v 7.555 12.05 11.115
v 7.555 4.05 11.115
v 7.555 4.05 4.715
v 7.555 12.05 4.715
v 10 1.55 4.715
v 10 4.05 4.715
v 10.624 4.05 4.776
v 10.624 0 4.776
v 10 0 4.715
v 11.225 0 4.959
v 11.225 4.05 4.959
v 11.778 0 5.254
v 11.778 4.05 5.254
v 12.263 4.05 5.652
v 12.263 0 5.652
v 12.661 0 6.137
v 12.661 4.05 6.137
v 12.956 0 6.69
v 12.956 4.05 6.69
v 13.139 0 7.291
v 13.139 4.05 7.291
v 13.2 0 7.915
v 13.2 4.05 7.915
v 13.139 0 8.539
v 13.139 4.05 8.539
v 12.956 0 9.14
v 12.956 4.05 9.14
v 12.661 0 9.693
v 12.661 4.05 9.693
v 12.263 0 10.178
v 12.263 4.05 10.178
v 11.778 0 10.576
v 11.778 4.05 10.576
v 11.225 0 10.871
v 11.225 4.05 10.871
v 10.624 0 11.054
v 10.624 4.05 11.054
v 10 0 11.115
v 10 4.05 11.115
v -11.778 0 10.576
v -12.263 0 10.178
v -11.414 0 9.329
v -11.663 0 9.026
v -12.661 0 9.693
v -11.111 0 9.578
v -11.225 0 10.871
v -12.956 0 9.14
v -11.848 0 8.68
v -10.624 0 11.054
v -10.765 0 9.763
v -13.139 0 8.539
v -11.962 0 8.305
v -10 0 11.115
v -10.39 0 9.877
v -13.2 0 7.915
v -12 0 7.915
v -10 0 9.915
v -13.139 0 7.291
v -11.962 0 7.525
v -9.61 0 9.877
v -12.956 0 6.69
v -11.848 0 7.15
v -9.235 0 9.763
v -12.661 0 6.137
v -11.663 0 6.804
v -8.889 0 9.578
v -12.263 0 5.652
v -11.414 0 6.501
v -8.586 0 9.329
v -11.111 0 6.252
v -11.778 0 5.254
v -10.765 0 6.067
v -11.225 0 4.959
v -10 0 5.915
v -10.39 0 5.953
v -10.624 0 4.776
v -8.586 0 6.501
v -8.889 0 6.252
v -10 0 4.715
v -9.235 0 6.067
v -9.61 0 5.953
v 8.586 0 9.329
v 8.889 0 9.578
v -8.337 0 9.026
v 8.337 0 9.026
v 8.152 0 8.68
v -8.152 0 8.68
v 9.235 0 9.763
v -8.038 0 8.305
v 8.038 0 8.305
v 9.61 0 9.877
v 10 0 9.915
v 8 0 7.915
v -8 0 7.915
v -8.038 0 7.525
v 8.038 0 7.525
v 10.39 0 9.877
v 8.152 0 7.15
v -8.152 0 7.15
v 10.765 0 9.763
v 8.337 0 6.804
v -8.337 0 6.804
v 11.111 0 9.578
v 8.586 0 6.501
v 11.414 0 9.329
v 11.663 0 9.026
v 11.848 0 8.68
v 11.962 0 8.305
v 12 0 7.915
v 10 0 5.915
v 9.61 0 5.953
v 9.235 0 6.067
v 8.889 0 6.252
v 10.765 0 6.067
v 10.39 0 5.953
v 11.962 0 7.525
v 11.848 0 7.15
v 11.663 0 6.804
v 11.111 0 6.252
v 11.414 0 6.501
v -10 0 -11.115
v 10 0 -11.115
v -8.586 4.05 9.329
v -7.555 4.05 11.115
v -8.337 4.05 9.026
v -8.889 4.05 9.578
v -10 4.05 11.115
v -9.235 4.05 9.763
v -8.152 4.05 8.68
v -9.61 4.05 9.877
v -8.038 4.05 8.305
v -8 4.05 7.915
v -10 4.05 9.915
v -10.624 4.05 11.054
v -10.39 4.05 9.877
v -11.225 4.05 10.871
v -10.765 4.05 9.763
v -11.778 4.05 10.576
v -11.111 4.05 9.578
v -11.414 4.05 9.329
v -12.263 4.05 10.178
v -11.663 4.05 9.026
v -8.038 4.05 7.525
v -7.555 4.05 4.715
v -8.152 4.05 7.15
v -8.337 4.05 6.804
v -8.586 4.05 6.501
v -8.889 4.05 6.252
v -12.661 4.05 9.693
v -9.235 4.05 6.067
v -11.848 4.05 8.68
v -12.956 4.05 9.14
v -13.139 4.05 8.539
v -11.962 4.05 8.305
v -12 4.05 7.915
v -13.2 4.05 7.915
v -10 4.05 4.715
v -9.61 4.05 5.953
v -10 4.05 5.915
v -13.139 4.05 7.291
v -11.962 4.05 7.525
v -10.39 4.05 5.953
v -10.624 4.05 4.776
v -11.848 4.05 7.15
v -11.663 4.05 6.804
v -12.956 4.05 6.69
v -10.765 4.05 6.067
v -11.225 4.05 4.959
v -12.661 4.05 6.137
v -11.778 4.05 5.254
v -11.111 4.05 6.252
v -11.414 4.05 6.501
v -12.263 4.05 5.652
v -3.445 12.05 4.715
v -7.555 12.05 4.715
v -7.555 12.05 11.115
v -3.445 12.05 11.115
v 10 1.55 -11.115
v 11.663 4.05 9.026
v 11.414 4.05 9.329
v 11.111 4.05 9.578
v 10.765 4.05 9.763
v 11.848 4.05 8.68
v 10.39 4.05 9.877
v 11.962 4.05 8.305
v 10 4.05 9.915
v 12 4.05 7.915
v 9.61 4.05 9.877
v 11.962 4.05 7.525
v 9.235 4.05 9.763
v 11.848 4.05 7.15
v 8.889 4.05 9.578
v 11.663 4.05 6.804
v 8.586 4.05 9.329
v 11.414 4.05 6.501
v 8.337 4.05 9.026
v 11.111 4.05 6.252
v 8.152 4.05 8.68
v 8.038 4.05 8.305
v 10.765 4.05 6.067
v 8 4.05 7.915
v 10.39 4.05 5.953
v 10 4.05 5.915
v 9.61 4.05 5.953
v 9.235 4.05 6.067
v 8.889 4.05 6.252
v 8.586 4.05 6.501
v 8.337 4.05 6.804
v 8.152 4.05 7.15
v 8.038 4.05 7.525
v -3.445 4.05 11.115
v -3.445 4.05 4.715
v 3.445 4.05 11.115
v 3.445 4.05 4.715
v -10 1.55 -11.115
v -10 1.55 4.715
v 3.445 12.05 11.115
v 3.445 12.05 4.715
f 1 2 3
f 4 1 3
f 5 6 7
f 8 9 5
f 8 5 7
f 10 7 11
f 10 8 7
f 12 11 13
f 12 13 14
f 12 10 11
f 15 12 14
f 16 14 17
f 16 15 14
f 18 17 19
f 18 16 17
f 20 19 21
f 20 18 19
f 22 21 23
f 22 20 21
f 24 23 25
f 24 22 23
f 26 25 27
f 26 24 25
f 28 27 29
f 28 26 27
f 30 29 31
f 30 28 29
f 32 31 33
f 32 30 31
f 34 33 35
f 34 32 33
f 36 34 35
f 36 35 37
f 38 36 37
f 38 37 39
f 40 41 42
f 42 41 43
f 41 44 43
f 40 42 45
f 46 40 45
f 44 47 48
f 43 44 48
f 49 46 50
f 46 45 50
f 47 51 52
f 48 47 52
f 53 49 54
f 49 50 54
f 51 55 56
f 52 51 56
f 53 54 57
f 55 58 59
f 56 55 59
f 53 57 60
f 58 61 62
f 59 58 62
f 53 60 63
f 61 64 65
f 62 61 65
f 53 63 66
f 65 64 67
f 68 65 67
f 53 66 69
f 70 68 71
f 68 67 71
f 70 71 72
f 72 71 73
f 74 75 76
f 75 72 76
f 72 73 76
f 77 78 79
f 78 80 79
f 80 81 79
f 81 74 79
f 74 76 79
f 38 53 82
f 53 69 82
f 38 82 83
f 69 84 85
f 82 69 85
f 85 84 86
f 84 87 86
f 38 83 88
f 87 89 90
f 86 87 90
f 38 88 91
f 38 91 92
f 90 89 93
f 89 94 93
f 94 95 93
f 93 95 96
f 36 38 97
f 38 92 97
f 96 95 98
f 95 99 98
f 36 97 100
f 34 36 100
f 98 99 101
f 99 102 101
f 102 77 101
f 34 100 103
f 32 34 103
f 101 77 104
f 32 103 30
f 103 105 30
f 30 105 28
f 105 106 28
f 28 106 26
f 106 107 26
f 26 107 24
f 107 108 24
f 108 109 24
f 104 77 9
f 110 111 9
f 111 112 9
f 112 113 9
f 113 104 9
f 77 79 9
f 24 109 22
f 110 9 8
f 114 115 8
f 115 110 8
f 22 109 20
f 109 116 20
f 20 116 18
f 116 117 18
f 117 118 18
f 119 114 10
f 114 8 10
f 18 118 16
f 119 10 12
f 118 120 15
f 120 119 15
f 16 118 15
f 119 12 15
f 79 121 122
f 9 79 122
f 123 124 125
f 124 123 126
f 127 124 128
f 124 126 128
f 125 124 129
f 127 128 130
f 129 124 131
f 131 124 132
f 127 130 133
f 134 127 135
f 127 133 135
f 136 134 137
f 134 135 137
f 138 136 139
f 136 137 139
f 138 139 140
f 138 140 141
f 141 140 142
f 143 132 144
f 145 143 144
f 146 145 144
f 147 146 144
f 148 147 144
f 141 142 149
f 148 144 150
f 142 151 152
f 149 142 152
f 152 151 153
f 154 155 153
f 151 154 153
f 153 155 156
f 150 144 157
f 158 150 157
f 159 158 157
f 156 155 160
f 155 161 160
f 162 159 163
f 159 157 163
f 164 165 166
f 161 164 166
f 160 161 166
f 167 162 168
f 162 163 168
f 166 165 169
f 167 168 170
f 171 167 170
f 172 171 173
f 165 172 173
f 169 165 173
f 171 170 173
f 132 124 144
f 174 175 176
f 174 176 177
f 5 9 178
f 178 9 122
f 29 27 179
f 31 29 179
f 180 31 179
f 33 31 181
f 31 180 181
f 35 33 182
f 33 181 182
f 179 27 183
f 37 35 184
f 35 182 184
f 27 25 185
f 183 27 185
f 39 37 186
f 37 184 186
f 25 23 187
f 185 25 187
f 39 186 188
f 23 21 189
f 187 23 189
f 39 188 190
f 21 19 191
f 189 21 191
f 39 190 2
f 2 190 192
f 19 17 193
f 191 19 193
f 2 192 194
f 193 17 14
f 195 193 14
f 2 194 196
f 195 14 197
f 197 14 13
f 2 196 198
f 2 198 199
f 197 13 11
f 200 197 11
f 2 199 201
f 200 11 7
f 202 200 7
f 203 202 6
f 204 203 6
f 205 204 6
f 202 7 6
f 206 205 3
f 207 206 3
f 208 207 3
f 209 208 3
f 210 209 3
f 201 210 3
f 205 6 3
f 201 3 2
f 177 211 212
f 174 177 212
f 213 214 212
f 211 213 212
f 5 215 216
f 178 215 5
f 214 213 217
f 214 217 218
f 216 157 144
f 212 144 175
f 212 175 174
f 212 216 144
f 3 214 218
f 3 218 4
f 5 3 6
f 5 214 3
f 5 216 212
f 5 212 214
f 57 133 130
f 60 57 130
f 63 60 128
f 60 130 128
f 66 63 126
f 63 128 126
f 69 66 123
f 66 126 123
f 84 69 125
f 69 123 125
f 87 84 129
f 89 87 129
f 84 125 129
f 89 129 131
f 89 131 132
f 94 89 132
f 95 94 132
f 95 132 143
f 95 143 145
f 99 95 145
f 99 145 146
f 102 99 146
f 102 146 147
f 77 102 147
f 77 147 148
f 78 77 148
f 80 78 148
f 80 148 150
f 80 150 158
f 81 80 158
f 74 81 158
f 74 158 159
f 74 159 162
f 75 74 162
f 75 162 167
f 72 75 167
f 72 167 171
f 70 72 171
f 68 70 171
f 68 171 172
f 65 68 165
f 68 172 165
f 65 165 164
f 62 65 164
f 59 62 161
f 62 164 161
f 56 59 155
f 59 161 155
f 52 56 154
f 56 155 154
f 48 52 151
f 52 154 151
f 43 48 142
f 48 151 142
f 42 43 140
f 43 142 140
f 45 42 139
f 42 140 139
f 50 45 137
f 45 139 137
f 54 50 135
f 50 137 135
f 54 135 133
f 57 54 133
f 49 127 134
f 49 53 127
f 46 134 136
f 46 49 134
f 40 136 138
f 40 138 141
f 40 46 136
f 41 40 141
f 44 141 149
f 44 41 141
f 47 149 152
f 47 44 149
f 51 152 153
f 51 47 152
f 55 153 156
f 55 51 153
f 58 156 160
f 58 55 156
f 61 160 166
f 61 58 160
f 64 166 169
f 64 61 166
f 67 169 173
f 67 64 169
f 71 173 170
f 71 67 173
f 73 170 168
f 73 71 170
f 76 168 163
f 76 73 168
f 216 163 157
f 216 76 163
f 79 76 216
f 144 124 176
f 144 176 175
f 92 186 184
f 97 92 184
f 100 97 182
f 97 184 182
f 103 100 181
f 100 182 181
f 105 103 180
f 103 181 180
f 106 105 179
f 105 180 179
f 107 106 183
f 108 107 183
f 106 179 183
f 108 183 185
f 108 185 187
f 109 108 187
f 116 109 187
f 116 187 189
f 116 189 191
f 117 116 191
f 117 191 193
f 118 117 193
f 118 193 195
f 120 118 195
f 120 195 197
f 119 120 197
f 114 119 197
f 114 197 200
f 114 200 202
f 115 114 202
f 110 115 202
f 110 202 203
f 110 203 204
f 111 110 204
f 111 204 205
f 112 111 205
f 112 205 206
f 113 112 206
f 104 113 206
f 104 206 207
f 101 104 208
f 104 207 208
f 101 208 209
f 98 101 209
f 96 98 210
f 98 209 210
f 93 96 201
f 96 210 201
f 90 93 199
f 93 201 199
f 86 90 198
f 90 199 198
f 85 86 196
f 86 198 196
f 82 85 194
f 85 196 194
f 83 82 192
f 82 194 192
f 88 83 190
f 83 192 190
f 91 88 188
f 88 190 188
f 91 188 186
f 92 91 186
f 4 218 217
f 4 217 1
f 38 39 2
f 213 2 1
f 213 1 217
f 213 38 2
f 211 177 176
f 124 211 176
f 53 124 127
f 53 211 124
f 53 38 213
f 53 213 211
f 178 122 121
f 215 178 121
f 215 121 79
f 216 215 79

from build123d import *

# Parameters (mm, degrees)
BOSS_EXTRUDE1_DEPTH = 1.55
BOSS_EXTRUDE2_DEPTH = 2.5
SKETCH4_W           = 4.11
SKETCH4_H           = 6.4
BOSS_EXTRUDE3_DEPTH = 8
SKETCH6_R           = 2
CUT_EXTRUDE1_DEPTH  = 20.020600017


with BuildPart() as part:
    # Sketch1 → Boss-Extrude1 (new body)
    with BuildSketch(Plane(origin=(0, 0, 0), x_dir=(1, 0, 0), z_dir=(0, 1, 0))):
        with BuildLine():
            Line((10, -4.715), (10, 11.115))
            Line((10, 11.115), (-10, 11.115))
            Line((-10, 11.115), (-10, -4.715))
            ThreePointArc((-10, -4.715), (-13.2, -7.915), (-10, -11.115))
            Line((-10, -11.115), (10, -11.115))
            ThreePointArc((10, -11.115), (13.2, -7.915), (10, -4.715))
        make_face()
    extrude(amount=BOSS_EXTRUDE1_DEPTH)

    # Sketch3 → Boss-Extrude2 (add)
    with BuildSketch(Plane(origin=(0, 1.55, 0), x_dir=(1, 0, 0), z_dir=(0, 1, 0))):
        with BuildLine():
            Line((-10, -4.715), (10, -4.715))
            ThreePointArc((10, -4.715), (13.2, -7.915), (10, -11.115))
            Line((10, -11.115), (-10, -11.115))
            ThreePointArc((-10, -11.115), (-13.2, -7.915), (-10, -4.715))
        make_face()
    extrude(amount=BOSS_EXTRUDE2_DEPTH)

    # Sketch4 → Boss-Extrude3 (add)
    with BuildSketch(Plane(origin=(0, 4.05, 0), x_dir=(1, 0, 0), z_dir=(0, 1, 0))):
        with Locations((-5.5, -7.915)):
            Rectangle(SKETCH4_W, SKETCH4_H)
        with Locations((5.5, -7.915)):
            Rectangle(SKETCH4_W, SKETCH4_H)
    extrude(amount=BOSS_EXTRUDE3_DEPTH)

    # Sketch6 → Cut-Extrude1 (cut, through all)
    with BuildSketch(Plane(origin=(0, 4.05, 0), x_dir=(1, 0, 0), z_dir=(0, 1, 0))):
        with Locations(Location((-10, -7.915, 0), (0, 0, 270))):
            Circle(SKETCH6_R)
        with Locations(Location((10, -7.915, 0), (0, 0, 270))):
            Circle(SKETCH6_R)
    extrude(amount=-CUT_EXTRUDE1_DEPTH, mode=Mode.SUBTRACT)


solid = part.part
